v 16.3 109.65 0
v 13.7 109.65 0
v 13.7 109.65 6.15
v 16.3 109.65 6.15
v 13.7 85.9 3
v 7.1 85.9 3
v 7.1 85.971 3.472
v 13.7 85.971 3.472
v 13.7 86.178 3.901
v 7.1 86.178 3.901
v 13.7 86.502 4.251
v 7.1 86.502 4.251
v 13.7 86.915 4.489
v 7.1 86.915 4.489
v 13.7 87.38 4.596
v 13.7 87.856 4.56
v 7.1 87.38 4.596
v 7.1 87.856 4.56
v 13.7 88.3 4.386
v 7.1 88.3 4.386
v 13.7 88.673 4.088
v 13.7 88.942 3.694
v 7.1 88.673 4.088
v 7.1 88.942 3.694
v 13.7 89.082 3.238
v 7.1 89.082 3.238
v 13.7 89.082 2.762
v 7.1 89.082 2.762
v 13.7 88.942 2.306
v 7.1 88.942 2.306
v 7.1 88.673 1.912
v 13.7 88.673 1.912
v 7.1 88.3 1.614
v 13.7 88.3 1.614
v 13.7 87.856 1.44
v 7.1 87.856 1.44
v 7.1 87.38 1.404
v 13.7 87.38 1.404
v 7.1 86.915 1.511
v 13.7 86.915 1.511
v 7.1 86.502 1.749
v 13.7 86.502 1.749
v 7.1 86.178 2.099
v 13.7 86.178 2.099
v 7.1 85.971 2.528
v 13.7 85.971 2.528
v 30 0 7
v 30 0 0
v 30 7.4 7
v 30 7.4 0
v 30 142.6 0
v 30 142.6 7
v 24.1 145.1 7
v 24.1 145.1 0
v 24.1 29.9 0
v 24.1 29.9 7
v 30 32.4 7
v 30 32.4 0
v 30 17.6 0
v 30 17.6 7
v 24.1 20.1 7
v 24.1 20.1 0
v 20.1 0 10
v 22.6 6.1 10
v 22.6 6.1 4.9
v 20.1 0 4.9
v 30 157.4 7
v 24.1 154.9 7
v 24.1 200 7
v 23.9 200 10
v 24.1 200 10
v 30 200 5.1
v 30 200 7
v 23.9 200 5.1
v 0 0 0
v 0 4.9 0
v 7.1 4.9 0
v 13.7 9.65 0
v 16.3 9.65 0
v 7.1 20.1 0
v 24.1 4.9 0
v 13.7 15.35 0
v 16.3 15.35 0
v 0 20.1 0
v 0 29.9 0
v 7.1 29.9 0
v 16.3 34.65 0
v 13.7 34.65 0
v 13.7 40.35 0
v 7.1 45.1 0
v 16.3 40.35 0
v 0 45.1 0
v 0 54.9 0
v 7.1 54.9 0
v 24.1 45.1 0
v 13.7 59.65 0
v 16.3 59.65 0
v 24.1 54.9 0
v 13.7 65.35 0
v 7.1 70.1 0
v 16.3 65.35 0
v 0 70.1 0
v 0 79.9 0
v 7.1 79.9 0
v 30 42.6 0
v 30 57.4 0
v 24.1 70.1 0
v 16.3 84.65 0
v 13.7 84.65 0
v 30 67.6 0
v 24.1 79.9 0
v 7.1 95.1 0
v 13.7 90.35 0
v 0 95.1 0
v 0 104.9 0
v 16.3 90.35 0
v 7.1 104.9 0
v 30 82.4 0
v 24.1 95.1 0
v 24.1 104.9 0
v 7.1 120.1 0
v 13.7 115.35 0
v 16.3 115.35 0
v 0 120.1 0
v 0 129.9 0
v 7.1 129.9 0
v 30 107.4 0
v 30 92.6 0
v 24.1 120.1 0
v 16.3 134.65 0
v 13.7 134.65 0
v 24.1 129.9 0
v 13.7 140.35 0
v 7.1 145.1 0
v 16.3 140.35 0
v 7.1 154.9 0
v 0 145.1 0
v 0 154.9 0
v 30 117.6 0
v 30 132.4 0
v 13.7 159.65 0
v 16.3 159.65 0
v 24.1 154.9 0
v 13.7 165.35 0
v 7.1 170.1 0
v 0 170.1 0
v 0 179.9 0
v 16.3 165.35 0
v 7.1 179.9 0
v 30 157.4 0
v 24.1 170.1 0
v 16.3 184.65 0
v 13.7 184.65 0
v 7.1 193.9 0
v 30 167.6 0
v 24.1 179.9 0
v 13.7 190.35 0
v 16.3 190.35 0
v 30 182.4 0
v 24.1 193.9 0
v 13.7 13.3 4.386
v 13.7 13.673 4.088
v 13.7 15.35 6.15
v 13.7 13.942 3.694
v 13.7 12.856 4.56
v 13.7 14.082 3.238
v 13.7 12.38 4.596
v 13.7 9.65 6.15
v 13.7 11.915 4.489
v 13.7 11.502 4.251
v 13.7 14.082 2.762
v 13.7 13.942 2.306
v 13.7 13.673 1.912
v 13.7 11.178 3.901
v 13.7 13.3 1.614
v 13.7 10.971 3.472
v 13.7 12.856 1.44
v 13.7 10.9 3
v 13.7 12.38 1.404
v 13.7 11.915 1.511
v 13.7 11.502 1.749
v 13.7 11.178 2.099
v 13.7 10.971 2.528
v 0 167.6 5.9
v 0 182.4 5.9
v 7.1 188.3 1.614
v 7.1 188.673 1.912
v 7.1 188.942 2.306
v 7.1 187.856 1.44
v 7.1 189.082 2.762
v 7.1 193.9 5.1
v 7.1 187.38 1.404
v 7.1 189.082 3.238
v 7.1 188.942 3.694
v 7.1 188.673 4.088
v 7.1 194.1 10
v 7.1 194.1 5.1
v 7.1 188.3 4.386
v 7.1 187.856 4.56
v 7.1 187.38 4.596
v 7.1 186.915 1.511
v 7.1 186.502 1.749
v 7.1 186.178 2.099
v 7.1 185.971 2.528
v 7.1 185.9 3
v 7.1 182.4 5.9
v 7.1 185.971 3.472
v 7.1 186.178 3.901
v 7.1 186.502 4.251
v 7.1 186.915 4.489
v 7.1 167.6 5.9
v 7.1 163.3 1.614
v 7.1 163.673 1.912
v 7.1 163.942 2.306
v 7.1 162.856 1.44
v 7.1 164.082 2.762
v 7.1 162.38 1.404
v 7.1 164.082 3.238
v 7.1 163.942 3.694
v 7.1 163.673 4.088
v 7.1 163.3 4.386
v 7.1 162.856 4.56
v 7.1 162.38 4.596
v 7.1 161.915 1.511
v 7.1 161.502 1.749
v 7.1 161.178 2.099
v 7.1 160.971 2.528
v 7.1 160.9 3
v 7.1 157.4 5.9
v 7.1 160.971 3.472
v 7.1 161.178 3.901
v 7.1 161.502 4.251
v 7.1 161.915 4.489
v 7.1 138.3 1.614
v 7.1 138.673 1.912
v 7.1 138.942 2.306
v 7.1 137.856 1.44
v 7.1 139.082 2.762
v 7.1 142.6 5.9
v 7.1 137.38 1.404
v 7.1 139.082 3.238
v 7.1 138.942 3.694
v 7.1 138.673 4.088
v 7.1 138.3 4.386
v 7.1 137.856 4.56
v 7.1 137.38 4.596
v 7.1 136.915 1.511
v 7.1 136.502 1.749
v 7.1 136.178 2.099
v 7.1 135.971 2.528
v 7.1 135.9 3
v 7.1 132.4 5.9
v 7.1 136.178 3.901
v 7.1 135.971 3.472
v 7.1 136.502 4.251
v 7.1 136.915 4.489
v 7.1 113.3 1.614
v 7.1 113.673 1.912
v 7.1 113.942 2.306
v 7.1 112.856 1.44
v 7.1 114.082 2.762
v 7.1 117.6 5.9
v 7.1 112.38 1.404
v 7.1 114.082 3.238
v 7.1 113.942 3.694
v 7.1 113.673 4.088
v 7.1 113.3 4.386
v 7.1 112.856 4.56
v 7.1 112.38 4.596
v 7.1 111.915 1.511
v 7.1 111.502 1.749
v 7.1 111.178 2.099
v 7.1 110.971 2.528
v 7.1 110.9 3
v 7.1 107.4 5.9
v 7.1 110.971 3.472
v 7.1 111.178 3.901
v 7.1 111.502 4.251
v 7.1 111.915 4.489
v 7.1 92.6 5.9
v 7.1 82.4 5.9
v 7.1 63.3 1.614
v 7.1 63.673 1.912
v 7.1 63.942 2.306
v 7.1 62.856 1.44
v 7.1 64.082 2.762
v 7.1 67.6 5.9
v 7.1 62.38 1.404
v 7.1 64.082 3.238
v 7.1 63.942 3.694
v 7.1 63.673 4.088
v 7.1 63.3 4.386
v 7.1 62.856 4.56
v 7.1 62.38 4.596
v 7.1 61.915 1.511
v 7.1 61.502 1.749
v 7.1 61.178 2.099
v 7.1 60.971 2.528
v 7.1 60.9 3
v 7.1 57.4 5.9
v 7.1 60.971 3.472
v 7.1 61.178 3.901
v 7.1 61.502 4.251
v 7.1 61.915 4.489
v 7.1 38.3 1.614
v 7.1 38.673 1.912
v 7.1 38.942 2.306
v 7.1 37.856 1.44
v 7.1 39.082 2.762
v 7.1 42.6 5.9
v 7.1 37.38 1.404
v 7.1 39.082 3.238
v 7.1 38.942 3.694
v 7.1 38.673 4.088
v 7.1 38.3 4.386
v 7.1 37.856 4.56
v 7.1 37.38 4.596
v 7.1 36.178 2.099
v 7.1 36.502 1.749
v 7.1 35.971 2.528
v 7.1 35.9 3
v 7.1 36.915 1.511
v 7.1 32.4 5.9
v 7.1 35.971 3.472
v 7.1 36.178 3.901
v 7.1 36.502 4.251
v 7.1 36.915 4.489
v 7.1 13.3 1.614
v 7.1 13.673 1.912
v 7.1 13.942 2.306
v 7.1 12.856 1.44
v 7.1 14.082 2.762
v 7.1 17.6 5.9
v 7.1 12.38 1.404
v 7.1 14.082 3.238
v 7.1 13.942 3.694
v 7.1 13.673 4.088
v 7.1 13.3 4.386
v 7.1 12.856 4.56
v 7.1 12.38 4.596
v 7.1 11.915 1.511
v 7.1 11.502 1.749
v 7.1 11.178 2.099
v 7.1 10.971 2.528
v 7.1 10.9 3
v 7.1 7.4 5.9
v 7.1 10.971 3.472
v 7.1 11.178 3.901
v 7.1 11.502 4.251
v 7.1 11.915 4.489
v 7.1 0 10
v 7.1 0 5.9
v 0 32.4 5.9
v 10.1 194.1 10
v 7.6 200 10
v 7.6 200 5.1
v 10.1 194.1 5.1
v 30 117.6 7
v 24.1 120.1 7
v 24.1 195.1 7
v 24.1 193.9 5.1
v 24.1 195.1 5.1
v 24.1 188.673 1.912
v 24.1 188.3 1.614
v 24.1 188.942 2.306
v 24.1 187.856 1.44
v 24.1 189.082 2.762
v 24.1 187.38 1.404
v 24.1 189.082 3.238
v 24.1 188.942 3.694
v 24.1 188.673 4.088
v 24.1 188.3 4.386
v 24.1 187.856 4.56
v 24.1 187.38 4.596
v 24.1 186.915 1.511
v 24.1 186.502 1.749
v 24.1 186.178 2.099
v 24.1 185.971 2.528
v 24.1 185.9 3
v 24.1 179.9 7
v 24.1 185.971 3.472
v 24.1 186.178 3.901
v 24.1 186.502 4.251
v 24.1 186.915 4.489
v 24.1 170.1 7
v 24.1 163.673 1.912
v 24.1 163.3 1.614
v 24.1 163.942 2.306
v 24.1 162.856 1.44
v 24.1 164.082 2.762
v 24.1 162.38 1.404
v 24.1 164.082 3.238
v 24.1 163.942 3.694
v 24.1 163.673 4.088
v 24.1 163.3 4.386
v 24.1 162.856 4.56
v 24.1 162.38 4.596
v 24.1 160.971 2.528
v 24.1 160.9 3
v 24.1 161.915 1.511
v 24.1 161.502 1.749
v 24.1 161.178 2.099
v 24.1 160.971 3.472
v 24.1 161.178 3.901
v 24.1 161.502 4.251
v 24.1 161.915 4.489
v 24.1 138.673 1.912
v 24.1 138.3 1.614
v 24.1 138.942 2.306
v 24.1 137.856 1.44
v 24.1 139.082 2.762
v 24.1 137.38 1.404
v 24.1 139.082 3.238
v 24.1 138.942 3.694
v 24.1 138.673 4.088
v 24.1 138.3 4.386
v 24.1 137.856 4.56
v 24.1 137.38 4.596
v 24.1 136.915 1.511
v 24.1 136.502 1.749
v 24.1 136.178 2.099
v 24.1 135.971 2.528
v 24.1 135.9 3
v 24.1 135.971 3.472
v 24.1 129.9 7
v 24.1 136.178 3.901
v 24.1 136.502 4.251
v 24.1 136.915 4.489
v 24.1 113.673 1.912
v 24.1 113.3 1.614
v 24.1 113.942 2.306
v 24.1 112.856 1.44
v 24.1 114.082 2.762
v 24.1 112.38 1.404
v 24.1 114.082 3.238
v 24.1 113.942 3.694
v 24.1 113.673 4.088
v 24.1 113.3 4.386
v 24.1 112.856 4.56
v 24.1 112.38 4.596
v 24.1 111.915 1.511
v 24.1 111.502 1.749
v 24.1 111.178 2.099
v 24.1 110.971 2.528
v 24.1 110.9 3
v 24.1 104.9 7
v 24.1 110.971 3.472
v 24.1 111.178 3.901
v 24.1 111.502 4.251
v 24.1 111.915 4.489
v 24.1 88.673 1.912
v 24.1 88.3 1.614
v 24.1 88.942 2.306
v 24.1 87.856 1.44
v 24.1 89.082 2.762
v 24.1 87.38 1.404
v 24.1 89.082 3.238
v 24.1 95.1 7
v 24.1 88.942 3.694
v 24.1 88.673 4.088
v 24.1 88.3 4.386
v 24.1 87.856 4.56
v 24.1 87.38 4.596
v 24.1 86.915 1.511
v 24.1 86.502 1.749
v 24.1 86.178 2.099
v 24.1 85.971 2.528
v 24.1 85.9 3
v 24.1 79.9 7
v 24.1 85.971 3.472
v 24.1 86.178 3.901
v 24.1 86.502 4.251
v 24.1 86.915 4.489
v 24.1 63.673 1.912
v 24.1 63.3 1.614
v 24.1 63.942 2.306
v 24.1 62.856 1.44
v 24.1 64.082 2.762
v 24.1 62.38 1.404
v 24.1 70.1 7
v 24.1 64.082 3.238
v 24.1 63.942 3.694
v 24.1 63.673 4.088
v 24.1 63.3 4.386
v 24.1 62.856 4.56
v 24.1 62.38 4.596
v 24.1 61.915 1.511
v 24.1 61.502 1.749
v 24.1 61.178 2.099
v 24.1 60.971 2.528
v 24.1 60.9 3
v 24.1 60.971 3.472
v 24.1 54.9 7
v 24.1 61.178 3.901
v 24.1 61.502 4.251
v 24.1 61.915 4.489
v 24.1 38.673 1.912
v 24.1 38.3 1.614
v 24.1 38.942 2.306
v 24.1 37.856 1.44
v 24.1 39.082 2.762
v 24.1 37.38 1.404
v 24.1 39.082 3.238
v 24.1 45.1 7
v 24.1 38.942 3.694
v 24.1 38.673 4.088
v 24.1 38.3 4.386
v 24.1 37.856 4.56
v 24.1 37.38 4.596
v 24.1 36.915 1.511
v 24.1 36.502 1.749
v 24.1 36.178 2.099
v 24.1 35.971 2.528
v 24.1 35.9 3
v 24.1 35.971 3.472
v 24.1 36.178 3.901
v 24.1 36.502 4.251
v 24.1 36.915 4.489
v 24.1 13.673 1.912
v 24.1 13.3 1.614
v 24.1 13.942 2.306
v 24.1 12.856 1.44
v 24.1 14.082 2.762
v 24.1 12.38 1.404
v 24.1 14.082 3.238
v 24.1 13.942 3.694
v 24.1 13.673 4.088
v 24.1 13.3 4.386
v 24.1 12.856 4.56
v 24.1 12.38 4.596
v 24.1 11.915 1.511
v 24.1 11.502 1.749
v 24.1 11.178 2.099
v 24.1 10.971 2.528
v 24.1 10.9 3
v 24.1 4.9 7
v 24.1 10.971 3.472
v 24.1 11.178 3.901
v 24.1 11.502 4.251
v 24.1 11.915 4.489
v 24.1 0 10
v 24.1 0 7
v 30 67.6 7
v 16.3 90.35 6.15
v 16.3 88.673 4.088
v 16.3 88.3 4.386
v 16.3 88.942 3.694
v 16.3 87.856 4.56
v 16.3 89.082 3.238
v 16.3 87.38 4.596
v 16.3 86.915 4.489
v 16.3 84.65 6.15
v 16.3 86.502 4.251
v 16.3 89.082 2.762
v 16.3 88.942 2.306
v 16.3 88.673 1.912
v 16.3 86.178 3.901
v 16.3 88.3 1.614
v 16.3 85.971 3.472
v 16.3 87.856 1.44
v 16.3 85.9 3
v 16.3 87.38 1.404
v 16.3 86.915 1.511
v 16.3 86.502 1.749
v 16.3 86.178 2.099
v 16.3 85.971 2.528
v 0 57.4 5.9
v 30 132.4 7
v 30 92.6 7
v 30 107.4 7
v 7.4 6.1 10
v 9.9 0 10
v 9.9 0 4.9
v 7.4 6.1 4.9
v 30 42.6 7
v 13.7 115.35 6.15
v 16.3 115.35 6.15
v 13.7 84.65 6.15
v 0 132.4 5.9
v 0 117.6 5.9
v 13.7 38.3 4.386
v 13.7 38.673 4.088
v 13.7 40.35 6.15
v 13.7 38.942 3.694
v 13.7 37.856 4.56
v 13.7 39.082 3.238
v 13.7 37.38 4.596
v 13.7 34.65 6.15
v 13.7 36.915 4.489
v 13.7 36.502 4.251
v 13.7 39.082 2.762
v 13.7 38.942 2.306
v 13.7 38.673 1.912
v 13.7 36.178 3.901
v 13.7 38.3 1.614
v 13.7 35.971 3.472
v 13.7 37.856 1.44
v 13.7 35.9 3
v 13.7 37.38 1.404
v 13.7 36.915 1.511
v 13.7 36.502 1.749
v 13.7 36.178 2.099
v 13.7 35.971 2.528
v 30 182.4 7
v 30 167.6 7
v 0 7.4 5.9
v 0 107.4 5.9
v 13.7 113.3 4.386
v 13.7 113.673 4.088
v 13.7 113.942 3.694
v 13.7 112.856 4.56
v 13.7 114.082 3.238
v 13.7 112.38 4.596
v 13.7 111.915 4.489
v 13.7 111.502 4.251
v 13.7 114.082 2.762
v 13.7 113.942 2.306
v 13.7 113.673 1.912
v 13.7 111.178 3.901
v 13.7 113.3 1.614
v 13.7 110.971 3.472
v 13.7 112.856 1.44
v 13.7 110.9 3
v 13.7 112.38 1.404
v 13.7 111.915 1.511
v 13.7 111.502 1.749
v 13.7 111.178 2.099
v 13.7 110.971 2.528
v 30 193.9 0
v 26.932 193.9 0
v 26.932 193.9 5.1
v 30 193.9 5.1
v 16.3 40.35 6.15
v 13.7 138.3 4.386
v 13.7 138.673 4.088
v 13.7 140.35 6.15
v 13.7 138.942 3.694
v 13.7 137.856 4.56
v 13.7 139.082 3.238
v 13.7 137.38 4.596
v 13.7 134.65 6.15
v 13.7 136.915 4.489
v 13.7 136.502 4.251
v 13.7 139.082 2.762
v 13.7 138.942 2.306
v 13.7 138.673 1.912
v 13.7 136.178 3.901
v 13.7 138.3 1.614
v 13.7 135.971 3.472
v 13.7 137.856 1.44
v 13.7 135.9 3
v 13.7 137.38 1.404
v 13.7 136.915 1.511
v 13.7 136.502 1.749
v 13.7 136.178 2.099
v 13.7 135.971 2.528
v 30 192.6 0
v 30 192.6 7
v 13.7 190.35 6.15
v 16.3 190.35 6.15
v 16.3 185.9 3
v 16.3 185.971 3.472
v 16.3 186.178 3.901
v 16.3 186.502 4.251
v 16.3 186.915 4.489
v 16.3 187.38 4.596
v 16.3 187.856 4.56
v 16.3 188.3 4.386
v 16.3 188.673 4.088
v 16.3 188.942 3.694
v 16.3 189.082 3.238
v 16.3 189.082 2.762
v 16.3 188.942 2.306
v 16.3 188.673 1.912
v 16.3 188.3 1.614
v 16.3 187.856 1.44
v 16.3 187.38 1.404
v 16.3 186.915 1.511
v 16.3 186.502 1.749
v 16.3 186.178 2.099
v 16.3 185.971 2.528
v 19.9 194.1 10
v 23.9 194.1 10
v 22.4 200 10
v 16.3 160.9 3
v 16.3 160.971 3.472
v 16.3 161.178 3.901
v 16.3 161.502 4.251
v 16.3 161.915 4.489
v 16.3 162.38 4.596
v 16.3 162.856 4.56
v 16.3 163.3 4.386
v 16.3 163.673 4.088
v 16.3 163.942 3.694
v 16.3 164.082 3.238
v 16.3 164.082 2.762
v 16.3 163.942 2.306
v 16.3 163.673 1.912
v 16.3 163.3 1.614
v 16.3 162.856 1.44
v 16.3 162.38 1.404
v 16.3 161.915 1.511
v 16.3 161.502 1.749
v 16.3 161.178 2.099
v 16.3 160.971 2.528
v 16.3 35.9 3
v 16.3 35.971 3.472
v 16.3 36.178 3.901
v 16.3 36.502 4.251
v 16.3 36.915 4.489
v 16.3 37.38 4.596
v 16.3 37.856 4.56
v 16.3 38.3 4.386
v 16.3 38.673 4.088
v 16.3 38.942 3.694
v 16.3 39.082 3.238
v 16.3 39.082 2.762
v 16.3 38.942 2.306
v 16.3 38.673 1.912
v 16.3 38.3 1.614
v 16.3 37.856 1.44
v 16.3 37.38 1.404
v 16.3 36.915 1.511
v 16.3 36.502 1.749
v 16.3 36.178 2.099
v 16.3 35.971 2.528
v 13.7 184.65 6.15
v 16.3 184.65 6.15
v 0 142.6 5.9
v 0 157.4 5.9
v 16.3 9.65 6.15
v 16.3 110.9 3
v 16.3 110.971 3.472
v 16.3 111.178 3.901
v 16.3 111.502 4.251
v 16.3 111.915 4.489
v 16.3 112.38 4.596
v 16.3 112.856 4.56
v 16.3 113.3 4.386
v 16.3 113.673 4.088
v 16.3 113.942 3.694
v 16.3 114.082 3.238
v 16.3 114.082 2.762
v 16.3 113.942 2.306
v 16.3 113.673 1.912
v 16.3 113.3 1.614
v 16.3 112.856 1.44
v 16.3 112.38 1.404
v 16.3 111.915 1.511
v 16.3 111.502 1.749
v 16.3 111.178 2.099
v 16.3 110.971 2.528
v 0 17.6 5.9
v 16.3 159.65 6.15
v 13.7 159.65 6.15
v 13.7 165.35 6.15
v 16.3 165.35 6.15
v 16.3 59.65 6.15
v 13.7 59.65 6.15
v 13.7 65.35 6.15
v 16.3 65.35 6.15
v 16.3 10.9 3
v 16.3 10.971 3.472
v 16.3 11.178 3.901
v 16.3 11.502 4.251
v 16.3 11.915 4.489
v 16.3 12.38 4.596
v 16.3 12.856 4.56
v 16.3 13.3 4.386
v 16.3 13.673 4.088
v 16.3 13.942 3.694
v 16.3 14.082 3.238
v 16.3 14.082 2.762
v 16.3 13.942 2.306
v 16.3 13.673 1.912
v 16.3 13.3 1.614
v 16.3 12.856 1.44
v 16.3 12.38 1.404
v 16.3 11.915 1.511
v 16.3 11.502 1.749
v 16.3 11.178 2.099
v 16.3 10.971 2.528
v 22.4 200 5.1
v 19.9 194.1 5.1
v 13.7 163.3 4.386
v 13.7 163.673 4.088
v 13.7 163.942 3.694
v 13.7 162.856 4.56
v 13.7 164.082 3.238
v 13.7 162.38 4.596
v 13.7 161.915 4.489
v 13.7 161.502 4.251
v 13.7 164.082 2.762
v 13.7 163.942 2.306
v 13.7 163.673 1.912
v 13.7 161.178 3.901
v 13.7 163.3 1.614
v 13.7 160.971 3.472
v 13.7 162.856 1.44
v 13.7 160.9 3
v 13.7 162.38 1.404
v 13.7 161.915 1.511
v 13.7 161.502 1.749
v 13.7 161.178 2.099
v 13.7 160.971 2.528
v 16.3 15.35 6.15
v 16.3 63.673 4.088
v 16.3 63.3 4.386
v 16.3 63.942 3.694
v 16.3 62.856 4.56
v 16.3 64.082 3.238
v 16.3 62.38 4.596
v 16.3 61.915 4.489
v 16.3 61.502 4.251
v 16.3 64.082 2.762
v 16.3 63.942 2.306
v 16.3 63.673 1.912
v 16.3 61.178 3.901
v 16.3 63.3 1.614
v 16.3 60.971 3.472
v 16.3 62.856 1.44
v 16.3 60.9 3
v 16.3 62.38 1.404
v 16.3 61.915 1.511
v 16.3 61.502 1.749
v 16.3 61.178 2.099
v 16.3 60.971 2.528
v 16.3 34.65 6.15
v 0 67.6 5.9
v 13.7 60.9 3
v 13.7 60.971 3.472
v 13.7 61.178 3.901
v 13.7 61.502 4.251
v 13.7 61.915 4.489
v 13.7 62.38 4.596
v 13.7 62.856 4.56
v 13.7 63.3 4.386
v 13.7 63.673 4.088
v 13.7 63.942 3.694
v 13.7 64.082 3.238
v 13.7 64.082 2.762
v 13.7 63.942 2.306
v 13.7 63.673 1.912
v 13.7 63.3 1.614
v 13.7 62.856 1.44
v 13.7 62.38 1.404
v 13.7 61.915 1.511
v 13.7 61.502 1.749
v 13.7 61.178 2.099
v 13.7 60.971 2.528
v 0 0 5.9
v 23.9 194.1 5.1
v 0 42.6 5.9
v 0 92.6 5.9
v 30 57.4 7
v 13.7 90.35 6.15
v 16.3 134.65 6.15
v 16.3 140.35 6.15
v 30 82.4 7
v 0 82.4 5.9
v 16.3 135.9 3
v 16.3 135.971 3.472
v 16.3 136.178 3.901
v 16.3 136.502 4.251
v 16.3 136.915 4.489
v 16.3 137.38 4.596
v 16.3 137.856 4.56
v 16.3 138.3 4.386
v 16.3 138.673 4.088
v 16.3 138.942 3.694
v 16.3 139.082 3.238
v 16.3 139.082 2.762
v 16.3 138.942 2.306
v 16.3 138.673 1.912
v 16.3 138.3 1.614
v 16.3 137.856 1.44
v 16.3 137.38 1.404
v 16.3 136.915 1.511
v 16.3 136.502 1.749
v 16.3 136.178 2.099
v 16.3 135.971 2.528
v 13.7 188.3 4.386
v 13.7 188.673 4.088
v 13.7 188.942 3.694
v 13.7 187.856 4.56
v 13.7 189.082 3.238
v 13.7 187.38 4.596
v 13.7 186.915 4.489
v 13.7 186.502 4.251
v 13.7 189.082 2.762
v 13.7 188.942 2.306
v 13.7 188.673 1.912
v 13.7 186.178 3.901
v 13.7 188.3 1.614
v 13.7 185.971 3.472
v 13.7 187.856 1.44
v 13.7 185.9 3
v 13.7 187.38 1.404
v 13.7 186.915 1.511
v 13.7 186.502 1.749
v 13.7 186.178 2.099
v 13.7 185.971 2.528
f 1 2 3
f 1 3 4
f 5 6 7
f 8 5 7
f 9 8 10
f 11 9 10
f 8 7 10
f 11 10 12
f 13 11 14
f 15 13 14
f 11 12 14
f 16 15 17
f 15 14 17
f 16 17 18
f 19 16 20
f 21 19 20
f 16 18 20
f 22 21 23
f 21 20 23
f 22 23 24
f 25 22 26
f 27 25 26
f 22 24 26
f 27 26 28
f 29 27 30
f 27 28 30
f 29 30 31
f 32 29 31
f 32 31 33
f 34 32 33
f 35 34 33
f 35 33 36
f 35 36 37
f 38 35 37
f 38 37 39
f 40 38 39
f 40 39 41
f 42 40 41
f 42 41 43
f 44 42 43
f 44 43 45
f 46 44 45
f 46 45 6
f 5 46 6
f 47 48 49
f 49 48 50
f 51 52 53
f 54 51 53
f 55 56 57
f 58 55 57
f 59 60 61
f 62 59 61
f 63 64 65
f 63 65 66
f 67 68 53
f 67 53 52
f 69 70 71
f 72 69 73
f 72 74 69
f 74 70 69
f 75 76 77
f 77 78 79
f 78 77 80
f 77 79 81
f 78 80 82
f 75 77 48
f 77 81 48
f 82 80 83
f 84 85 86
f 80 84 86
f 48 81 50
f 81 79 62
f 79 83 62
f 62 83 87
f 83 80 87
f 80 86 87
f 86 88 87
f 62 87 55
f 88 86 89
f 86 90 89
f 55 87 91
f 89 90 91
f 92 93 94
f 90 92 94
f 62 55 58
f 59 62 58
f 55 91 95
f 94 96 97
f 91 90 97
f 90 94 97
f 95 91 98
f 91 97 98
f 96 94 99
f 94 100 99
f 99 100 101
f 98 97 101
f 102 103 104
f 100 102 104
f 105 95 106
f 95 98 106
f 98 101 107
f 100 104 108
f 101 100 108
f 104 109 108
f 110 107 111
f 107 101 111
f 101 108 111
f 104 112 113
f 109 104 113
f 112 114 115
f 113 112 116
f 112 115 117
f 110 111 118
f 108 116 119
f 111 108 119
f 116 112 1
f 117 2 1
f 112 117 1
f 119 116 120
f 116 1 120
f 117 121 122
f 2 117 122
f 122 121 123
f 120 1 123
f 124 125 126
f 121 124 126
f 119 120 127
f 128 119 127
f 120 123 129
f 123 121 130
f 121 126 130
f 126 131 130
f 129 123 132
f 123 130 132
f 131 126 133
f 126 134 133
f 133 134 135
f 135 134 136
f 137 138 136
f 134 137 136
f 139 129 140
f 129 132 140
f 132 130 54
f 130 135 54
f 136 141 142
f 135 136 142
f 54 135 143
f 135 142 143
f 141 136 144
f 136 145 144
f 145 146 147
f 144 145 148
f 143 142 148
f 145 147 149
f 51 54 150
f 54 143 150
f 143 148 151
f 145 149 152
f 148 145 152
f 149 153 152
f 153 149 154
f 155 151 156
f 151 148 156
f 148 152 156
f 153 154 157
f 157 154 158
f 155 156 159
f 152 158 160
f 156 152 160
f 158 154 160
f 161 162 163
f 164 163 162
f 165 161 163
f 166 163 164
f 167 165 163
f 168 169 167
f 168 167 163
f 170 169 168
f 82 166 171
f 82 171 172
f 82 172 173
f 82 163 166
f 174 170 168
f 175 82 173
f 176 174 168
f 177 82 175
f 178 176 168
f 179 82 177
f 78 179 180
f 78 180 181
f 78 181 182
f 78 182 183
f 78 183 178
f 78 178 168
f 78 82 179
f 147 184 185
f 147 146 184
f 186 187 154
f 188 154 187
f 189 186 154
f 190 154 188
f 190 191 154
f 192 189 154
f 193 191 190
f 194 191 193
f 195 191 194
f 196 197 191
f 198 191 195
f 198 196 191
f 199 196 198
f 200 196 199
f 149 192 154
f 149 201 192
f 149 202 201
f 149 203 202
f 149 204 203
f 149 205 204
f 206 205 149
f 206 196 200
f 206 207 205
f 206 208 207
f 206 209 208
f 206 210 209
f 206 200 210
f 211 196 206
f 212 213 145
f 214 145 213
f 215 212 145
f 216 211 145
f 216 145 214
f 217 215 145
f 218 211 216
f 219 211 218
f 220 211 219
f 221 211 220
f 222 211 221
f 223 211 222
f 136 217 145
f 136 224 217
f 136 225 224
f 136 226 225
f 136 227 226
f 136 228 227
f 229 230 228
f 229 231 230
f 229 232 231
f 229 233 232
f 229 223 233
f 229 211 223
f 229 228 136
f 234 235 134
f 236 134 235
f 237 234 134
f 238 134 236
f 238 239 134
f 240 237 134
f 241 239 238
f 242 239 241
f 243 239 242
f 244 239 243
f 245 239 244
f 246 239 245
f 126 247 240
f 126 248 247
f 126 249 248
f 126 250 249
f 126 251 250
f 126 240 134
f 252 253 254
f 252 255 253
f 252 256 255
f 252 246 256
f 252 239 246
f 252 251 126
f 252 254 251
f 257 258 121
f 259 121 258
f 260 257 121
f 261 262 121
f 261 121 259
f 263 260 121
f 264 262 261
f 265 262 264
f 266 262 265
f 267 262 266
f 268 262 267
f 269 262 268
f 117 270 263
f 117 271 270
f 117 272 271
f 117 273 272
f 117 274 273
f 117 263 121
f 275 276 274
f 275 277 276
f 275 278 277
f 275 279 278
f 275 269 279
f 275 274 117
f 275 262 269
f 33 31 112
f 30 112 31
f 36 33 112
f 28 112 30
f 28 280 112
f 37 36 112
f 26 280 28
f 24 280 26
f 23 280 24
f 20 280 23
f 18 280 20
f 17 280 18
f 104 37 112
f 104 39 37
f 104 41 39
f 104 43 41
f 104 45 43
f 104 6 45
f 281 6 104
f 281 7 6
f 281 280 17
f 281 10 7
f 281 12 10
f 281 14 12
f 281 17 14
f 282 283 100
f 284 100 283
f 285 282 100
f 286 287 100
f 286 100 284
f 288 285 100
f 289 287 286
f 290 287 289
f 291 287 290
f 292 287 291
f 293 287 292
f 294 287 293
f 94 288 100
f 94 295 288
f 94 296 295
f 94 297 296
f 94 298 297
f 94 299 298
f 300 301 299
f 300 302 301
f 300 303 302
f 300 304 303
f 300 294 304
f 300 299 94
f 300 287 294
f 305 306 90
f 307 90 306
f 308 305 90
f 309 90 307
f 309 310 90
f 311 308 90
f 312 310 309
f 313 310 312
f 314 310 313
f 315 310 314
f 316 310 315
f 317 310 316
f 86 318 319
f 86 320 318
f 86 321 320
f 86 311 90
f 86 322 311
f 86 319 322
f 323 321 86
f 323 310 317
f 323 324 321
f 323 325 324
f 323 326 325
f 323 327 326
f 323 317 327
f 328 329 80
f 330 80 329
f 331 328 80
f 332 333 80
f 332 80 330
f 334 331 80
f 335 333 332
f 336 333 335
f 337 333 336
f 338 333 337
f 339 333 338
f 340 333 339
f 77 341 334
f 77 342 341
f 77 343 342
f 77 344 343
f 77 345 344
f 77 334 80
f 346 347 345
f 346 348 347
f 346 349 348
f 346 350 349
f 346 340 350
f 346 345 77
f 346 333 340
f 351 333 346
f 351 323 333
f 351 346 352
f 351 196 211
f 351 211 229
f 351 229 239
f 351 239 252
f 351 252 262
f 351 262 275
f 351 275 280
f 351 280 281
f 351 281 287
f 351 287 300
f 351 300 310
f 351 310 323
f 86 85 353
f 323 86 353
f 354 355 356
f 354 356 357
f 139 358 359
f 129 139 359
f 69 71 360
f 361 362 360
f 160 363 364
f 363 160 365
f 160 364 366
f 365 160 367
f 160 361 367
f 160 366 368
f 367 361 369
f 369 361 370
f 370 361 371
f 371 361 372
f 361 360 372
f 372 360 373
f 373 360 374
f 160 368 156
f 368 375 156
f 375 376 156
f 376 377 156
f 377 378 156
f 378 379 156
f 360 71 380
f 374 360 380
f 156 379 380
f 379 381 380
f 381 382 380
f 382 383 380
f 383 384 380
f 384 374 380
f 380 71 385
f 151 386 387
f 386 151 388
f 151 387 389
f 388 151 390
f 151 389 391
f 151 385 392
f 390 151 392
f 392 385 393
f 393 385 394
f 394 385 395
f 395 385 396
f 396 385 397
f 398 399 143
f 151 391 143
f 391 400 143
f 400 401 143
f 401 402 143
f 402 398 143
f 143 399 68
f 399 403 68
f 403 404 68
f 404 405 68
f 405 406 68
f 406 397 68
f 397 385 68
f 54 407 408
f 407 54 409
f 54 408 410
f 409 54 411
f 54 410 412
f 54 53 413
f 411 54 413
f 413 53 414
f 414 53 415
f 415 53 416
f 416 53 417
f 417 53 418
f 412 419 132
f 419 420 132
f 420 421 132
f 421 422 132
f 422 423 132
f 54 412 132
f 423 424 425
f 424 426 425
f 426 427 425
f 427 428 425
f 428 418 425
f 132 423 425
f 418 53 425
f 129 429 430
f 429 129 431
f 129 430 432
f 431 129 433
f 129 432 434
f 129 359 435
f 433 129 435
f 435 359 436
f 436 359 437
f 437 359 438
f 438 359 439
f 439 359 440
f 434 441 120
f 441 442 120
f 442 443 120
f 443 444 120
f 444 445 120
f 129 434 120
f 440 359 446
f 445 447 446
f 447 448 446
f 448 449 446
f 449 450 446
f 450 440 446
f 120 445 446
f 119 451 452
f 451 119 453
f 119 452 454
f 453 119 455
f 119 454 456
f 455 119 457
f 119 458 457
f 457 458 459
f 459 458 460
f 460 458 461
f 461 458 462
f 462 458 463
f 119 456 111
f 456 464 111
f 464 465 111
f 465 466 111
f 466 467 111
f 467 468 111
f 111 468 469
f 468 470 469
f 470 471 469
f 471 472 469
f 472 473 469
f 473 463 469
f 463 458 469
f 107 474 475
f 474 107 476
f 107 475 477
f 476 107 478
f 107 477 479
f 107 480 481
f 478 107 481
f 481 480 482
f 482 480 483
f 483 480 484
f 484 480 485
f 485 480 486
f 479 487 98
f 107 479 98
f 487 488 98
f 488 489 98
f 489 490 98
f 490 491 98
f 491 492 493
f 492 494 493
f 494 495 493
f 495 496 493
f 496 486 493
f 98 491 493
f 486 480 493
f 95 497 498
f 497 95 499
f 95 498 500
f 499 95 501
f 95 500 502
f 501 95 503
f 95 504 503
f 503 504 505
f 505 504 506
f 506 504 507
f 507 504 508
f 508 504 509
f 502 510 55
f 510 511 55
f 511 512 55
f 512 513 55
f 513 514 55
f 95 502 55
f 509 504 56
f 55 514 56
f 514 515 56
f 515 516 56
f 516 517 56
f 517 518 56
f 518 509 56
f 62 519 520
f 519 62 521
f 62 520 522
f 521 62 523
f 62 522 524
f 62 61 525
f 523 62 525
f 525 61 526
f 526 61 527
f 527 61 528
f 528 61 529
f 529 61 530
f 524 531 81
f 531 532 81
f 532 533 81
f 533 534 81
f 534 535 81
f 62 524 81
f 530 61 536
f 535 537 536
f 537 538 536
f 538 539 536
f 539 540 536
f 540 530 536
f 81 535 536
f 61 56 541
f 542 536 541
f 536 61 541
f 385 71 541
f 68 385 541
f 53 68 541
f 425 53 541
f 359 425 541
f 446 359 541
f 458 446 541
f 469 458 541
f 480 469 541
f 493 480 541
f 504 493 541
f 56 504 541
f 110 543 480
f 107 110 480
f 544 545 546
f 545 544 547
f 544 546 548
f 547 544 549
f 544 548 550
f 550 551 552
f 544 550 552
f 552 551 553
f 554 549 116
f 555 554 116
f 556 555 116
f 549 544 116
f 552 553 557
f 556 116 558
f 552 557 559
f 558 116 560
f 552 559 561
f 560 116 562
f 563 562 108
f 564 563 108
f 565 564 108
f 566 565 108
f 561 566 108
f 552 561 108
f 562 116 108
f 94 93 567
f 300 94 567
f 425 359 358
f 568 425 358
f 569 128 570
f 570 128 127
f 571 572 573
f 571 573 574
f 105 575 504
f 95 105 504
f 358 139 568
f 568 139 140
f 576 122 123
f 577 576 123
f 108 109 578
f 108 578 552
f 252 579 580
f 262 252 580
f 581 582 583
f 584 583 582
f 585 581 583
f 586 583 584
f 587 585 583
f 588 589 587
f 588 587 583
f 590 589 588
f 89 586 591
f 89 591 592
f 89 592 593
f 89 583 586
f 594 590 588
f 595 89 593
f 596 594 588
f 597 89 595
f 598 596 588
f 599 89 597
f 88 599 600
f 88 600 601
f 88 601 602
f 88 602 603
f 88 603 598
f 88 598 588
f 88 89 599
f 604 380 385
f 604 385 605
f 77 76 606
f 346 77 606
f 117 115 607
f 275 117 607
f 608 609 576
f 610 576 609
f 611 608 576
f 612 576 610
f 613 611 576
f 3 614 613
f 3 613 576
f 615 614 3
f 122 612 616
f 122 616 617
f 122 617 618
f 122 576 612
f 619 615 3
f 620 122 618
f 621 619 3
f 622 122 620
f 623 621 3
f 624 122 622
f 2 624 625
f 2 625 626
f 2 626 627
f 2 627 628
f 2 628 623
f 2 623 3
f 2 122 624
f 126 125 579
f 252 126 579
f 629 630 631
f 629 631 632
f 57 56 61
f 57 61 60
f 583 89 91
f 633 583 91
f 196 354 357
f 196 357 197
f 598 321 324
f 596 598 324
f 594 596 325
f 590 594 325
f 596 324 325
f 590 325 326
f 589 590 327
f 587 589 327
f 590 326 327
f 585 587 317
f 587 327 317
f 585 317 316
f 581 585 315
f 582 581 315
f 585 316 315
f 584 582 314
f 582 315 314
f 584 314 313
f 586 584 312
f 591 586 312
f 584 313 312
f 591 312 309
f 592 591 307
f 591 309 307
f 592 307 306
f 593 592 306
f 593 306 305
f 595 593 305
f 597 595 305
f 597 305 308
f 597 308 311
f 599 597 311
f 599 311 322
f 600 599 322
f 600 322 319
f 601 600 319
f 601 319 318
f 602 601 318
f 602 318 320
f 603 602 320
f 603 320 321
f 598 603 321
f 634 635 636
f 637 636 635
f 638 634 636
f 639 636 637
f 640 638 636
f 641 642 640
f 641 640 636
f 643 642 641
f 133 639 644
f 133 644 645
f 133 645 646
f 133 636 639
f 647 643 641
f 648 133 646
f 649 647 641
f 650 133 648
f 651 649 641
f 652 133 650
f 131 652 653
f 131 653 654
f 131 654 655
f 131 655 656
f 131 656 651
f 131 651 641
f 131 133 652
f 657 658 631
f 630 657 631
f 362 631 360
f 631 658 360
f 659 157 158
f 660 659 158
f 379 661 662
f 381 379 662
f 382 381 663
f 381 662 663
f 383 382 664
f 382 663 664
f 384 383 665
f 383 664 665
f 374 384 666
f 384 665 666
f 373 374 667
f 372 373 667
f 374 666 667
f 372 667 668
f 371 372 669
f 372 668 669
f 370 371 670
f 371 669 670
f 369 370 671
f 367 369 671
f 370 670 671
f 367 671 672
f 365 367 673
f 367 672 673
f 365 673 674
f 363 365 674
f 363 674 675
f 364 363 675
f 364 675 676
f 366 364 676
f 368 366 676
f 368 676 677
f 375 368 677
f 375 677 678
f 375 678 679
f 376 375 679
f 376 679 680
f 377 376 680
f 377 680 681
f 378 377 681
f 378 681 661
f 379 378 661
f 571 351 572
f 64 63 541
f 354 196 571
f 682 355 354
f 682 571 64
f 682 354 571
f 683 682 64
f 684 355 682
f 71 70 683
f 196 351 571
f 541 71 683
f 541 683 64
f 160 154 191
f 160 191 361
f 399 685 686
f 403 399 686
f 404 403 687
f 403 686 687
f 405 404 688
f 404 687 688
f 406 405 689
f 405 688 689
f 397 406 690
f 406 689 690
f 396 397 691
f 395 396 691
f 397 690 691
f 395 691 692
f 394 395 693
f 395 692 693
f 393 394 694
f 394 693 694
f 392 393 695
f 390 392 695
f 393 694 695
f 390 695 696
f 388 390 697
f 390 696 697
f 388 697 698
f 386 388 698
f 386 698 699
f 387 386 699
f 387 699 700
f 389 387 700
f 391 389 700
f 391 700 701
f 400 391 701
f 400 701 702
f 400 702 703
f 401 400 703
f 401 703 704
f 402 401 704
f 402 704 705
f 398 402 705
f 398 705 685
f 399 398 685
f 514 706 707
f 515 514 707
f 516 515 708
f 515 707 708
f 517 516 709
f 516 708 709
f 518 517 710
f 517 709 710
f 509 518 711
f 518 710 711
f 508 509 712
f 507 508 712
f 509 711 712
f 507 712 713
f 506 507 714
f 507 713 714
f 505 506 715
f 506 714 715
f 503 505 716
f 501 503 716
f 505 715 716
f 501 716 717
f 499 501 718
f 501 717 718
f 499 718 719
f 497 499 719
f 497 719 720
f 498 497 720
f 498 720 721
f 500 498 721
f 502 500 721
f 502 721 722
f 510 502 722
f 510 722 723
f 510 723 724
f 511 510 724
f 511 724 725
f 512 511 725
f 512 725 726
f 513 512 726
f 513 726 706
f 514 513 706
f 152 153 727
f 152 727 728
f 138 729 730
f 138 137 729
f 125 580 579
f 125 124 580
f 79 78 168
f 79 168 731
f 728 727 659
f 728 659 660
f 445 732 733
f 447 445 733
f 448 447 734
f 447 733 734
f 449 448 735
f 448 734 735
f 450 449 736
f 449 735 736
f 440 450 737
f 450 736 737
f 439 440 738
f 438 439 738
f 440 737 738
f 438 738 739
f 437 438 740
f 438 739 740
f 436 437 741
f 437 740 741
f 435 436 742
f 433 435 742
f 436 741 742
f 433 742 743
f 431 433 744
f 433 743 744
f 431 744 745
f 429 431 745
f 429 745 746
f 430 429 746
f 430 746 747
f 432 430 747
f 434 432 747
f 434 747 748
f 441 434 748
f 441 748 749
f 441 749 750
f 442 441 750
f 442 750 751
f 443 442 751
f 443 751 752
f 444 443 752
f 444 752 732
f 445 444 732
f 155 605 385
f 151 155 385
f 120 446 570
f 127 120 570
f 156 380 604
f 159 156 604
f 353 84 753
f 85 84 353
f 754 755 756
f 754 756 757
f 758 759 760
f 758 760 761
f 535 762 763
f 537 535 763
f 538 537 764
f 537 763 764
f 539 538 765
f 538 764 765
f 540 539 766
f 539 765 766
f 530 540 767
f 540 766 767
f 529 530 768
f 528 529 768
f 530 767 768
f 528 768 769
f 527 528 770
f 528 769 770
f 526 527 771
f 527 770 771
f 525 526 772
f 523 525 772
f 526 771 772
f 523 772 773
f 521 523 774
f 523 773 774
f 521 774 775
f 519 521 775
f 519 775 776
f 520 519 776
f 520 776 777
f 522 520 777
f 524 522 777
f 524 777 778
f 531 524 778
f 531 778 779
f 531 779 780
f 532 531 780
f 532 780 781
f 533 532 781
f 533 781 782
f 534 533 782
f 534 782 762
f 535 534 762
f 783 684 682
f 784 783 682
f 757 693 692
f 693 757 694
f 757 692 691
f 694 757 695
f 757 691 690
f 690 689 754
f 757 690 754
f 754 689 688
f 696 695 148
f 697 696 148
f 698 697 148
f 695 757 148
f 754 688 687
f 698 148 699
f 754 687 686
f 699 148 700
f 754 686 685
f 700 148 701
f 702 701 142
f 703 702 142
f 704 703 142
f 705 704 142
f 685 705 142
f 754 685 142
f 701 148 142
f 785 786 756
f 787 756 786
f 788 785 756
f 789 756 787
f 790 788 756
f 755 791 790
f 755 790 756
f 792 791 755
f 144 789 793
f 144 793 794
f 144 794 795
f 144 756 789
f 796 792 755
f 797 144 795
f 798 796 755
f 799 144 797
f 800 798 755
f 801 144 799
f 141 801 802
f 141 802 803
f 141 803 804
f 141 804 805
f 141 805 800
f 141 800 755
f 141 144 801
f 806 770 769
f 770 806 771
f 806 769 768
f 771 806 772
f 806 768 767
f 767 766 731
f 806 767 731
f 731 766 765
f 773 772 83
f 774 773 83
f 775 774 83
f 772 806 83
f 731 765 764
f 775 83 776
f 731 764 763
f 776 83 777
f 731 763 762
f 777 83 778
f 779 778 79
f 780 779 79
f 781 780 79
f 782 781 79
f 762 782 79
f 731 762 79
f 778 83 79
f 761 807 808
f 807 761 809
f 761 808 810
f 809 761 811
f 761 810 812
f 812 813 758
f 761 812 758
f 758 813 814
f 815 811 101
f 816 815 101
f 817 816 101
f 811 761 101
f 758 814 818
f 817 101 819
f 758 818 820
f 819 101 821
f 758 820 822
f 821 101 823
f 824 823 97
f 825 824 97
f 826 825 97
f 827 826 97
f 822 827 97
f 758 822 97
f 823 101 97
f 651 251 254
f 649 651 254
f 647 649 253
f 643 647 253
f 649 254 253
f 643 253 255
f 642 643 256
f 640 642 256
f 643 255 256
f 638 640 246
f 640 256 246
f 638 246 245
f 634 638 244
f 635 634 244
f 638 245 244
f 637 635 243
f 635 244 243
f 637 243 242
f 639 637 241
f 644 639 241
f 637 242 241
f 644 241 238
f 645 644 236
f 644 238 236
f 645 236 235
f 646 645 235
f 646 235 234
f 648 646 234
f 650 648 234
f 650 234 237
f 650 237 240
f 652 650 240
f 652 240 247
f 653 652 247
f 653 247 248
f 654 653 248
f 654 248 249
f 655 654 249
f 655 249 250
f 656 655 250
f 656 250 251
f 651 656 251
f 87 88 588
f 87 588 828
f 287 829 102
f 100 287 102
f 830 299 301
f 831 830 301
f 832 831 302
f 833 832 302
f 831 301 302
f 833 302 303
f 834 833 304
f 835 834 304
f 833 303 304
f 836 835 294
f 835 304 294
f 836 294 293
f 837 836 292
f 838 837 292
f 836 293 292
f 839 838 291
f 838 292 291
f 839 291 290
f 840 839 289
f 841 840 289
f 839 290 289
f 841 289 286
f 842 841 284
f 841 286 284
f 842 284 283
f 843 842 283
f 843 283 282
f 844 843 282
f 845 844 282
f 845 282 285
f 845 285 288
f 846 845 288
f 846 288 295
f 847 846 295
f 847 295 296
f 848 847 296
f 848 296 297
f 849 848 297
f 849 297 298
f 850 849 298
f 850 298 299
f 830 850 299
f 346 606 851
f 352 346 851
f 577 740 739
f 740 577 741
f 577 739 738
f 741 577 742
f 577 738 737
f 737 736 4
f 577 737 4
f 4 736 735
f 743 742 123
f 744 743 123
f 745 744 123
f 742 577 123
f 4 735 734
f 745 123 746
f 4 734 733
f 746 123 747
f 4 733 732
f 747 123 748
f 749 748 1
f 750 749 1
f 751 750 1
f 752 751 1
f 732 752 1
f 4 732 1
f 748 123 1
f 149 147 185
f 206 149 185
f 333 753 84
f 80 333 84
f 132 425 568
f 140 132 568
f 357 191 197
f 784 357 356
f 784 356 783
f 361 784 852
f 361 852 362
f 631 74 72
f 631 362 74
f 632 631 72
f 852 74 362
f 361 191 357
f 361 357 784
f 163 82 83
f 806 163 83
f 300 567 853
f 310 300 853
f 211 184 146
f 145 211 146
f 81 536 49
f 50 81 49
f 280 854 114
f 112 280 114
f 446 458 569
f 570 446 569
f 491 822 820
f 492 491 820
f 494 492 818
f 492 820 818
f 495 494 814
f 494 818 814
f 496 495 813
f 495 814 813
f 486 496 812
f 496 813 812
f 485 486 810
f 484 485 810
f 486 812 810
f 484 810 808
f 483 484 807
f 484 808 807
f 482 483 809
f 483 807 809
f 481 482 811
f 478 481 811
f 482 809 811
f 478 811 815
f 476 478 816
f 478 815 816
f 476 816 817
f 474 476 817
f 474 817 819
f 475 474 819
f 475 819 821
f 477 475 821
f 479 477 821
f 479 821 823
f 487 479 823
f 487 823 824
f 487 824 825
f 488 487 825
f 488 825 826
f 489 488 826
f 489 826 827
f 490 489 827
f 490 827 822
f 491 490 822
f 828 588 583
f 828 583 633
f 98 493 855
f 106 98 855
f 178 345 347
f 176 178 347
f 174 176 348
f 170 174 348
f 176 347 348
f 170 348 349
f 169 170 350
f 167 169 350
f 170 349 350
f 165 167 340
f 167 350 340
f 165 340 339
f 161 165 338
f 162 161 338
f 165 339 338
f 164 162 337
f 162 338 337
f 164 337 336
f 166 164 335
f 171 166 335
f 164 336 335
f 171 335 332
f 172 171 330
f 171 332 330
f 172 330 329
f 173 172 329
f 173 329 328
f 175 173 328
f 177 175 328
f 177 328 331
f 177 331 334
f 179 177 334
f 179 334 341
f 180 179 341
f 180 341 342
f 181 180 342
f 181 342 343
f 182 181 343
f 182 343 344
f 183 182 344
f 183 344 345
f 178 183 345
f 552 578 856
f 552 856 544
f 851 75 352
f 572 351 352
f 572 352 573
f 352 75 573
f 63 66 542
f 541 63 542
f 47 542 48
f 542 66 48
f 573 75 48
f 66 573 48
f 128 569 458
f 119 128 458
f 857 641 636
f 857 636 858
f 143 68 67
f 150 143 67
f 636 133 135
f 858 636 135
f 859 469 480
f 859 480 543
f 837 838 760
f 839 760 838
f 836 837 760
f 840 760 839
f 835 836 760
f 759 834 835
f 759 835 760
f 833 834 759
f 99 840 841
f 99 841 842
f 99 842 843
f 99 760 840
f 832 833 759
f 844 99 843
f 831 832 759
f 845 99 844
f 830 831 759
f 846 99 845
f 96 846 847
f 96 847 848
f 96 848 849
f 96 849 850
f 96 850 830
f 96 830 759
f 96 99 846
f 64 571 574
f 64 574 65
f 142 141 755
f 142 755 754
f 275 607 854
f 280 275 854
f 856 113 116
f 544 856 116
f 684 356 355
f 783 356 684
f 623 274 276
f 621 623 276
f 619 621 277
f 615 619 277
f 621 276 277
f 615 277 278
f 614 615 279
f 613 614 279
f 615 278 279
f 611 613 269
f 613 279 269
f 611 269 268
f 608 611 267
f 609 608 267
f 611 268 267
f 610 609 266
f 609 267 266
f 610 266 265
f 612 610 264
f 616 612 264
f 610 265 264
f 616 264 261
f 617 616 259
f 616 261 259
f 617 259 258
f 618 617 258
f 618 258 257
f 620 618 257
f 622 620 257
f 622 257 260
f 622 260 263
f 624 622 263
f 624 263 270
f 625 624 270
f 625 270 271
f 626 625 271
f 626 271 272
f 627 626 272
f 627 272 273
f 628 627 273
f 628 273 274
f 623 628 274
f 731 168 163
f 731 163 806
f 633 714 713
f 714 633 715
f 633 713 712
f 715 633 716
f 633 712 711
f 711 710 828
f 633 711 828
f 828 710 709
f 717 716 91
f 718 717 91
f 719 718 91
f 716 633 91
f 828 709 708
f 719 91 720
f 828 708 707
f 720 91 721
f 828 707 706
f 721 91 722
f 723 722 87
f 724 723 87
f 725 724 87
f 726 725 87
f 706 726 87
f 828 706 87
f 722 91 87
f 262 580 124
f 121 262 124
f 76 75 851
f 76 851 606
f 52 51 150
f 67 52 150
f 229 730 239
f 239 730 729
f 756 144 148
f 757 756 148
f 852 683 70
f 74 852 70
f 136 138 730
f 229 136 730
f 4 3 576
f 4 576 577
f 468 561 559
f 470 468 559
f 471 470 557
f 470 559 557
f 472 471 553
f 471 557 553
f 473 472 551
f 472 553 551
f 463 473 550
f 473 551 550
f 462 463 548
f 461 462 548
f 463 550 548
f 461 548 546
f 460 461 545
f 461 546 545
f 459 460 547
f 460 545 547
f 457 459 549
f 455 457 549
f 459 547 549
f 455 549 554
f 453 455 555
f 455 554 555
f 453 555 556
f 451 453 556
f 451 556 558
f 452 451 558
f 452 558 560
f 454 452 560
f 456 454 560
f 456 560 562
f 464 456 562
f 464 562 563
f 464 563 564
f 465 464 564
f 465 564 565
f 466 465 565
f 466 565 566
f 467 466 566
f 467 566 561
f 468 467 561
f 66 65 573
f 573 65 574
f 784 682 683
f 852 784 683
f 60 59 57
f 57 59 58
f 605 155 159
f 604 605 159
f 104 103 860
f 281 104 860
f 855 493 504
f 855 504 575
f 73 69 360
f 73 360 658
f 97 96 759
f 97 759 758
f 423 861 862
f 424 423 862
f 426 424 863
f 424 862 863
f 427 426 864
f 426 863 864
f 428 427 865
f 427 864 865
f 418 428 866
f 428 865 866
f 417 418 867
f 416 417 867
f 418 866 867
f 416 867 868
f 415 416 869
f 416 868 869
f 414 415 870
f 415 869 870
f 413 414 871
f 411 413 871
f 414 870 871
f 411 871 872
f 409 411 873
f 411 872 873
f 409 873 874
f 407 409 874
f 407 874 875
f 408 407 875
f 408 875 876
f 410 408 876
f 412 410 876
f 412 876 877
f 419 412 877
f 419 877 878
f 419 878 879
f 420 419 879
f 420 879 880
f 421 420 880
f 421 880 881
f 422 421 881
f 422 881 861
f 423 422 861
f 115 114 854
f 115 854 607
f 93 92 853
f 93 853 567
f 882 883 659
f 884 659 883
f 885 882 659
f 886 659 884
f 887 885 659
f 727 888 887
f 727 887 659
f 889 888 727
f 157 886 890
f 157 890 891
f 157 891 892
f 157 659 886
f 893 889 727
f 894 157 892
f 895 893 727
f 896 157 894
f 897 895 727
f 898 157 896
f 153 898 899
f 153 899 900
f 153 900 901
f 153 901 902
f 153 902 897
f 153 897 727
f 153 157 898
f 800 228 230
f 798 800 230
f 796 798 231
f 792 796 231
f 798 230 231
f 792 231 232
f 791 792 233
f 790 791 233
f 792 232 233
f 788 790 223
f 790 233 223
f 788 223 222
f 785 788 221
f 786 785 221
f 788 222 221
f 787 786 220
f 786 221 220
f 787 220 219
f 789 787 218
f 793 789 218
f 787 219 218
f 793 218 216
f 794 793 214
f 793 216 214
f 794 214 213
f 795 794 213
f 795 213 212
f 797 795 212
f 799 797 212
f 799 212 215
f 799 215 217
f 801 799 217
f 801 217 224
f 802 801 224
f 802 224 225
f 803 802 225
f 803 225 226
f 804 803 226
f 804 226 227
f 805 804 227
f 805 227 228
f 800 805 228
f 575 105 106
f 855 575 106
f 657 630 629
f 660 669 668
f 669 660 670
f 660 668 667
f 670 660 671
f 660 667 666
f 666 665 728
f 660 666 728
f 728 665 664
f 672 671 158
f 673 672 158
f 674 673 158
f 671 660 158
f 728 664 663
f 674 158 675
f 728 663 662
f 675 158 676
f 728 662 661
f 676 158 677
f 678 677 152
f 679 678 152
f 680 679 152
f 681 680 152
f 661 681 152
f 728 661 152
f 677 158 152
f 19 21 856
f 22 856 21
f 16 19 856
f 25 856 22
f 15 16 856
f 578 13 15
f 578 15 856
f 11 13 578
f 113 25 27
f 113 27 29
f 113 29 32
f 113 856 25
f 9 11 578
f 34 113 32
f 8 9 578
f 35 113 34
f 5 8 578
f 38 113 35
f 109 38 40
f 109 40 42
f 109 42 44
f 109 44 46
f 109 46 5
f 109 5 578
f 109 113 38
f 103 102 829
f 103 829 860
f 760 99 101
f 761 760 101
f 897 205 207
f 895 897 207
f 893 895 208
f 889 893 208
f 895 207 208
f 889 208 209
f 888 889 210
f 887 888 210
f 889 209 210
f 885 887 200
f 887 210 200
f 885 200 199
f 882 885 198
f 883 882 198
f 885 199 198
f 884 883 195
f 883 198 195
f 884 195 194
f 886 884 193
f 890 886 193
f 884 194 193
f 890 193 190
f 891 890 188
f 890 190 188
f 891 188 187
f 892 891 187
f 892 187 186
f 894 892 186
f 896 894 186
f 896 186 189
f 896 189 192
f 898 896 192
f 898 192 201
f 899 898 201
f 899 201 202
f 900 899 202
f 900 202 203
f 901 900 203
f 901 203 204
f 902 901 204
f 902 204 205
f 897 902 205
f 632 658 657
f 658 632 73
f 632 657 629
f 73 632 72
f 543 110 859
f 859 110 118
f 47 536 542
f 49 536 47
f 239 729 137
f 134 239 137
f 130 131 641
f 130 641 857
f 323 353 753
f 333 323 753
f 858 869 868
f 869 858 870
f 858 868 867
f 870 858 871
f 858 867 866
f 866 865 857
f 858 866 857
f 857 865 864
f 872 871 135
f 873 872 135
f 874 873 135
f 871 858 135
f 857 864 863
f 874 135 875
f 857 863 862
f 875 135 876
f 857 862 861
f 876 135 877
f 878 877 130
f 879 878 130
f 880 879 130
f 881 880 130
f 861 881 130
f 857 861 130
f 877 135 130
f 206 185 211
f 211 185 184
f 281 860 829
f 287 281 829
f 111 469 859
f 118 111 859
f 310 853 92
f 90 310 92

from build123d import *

# Parameters (mm, degrees)
SKETCH_W        = 30
SKETCH_H        = 200
PAD_DEPTH       = 10
POCKET_DEPTH    = 7.1
SKETCH002_W     = 200
SKETCH002_H     = 4.1
POCKET001_DEPTH = 7.1
SKETCH003_R     = 1.6
POCKET002_DEPTH = 25
SKETCH004_W     = 2.6
SKETCH004_H     = 5.7
POCKET003_DEPTH = 6.15
SKETCH006_W     = 200
SKETCH006_H     = 3
POCKET005_DEPTH = 5.9
POCKET006_DEPTH = 10
SKETCH008_W     = 5.9
SKETCH008_H     = 200
POCKET007_DEPTH = 3
POCKET008_DEPTH = 5.1
SKETCH010_W     = 30
SKETCH010_H     = 6.1
POCKET009_DEPTH = 5.1
POCKET010_DEPTH = 5


with BuildPart() as part:
    # Sketch → Pad (new body)
    with BuildSketch(Plane.XY):
        with Locations((15, 100)):
            Rectangle(SKETCH_W, SKETCH_H)
    extrude(amount=PAD_DEPTH)

    # Sketch001 (on Face4 of Pad) → Pocket (cut)
    with BuildSketch(Plane(origin=(0, 0, 0), x_dir=(0, -1, 0), z_dir=(-1, 0, 0))):
        Polygon((-199.7, 5.9), (-199.9, 0), (-179.9, 0), (-182.4, 5.9), align=None)
        Polygon((-167.6, 5.9), (-170.1, 0), (-154.9, 0), (-157.4, 5.9), align=None)
        Polygon((-142.6, 5.9), (-145.1, 0), (-129.9, 0), (-132.4, 5.9), align=None)
        Polygon((-117.6, 5.9), (-120.1, 0), (-104.9, 0), (-107.4, 5.9), align=None)
        Polygon((-92.6, 5.9), (-95.1, 0), (-79.9, 0), (-82.4, 5.9), align=None)
        Polygon((-67.6, 5.9), (-70.1, 0), (-54.9, 0), (-57.4, 5.9), align=None)
        Polygon((-42.6, 5.9), (-45.1, 0), (-29.9, 0), (-32.4, 5.9), align=None)
        Polygon((-17.6, 5.9), (-20.1, 0), (-4.9, 0), (-7.4, 5.9), align=None)
    extrude(amount=-POCKET_DEPTH, mode=Mode.SUBTRACT)

    # Sketch002 (on Face2 of Pocket) → Pocket001 (cut)
    with BuildSketch(Plane(origin=(0, 0, 0), x_dir=(0, -1, 0), z_dir=(-1, 0, 0))):
        with Locations((-100, 7.95)):
            Rectangle(SKETCH002_W, SKETCH002_H)
    extrude(amount=-POCKET001_DEPTH, mode=Mode.SUBTRACT)

    # Sketch003 (on Face9 of Pocket001) → Pocket002 (cut)
    with BuildSketch(Plane(origin=(7.1, 0, 0), x_dir=(0, -1, 0), z_dir=(-1, 0, 0))):
        with Locations((-37.5, 3)):
            Circle(SKETCH003_R)
        with Locations((-12.5, 3)):
            Circle(SKETCH003_R)
        with Locations((-62.5, 3)):
            Circle(SKETCH003_R)
        with Locations((-87.5, 3)):
            Circle(SKETCH003_R)
        with Locations((-112.5, 3)):
            Circle(SKETCH003_R)
        with Locations((-137.5, 3)):
            Circle(SKETCH003_R)
        with Locations((-162.5, 3)):
            Circle(SKETCH003_R)
        with Locations((-187.5, 3)):
            Circle(SKETCH003_R)
    extrude(amount=-POCKET002_DEPTH, mode=Mode.SUBTRACT)

    # Sketch004 (on Face2 of Pocket002) → Pocket003 (cut)
    with BuildSketch(Plane(origin=(0, 0, 0), x_dir=(1, 0, 0), z_dir=(0, 0, -1))):
        with Locations((15, -12.5)):
            Rectangle(SKETCH004_W, SKETCH004_H)
        with Locations((15, -37.5)):
            Rectangle(SKETCH004_W, SKETCH004_H)
        with Locations((15, -62.5)):
            Rectangle(SKETCH004_W, SKETCH004_H)
        with Locations((15, -87.5)):
            Rectangle(SKETCH004_W, SKETCH004_H)
        with Locations((15, -112.5)):
            Rectangle(SKETCH004_W, SKETCH004_H)
        with Locations((15, -137.5)):
            Rectangle(SKETCH004_W, SKETCH004_H)
        with Locations((15, -162.5)):
            Rectangle(SKETCH004_W, SKETCH004_H)
        with Locations((15, -187.5)):
            Rectangle(SKETCH004_W, SKETCH004_H)
    extrude(amount=-POCKET003_DEPTH, mode=Mode.SUBTRACT)

    # Sketch006 → Pocket005 (cut)
    with BuildSketch(Plane(origin=(0, 4.15414, -1.760229), x_dir=(-1, 0, 0), z_dir=(0, 0.920752, -0.390149))):
        with Locations((100, 8.5)):
            Rectangle(SKETCH006_W, SKETCH006_H)
    extrude(amount=-POCKET005_DEPTH, mode=Mode.SUBTRACT)

    # Sketch007 (on Face4 of Pocket005) → Pocket006 (cut)
    with BuildSketch(Plane.XY.offset(10)):
        Polygon((24.1, 20.1), (24.1, 4.9), (30, 7.4), (30, 17.6), align=None)
        Polygon((24.1, 45.1), (24.1, 29.9), (30, 32.4), (30, 42.6), align=None)
        Polygon((24.1, 70.1), (24.1, 54.9), (30, 57.4), (30, 67.6), align=None)
        Polygon((24.1, 95.1), (24.1, 79.9), (30, 82.4), (30, 92.6), align=None)
        Polygon((24.1, 120.1), (24.1, 104.9), (30, 107.4), (30, 117.6), align=None)
        Polygon((24.1, 145.1), (24.1, 129.9), (30, 132.4), (30, 142.6), align=None)
        Polygon((24.1, 170.1), (24.1, 154.9), (30, 157.4), (30, 167.6), align=None)
        Polygon((24.1, 195.1), (24.1, 179.9), (30, 182.4), (30, 192.6), align=None)
    extrude(amount=-POCKET006_DEPTH, mode=Mode.SUBTRACT)

    # Sketch008 (on Face4 of Pocket006) → Pocket007 (cut)
    with BuildSketch(Plane.XY.offset(10)):
        with Locations((27.05, 100)):
            Rectangle(SKETCH008_W, SKETCH008_H)
    extrude(amount=-POCKET007_DEPTH, mode=Mode.SUBTRACT)

    # Sketch009 (on Face6 of Pocket007) → Pocket008 (cut)
    with BuildSketch(Plane.XY.offset(10)):
        Polygon((7.4, 6.1), (22.6, 6.1), (20.1, 0), (9.9, 0), align=None)
    extrude(amount=-POCKET008_DEPTH, mode=Mode.SUBTRACT)

    # Sketch010 (on Face2 of Pocket008) → Pocket009 (cut)
    with BuildSketch(Plane(origin=(0, 0, 0), x_dir=(1, 0, 0), z_dir=(0, 0, -1))):
        with Locations((15, -196.95)):
            Rectangle(SKETCH010_W, SKETCH010_H)
    extrude(amount=-POCKET009_DEPTH, mode=Mode.SUBTRACT)

    # Sketch011 (on Face6 of Pocket009) → Pocket010 (cut)
    with BuildSketch(Plane.XY.offset(10)):
        Polygon((7.6, 200), (10.1, 194.1), (0, 194.1), (0, 200), align=None)
        Polygon((22.4, 200), (19.9, 194.1), (23.9, 194.1), (23.9, 200), align=None)
    extrude(amount=-POCKET010_DEPTH, mode=Mode.SUBTRACT)


solid = part.part
